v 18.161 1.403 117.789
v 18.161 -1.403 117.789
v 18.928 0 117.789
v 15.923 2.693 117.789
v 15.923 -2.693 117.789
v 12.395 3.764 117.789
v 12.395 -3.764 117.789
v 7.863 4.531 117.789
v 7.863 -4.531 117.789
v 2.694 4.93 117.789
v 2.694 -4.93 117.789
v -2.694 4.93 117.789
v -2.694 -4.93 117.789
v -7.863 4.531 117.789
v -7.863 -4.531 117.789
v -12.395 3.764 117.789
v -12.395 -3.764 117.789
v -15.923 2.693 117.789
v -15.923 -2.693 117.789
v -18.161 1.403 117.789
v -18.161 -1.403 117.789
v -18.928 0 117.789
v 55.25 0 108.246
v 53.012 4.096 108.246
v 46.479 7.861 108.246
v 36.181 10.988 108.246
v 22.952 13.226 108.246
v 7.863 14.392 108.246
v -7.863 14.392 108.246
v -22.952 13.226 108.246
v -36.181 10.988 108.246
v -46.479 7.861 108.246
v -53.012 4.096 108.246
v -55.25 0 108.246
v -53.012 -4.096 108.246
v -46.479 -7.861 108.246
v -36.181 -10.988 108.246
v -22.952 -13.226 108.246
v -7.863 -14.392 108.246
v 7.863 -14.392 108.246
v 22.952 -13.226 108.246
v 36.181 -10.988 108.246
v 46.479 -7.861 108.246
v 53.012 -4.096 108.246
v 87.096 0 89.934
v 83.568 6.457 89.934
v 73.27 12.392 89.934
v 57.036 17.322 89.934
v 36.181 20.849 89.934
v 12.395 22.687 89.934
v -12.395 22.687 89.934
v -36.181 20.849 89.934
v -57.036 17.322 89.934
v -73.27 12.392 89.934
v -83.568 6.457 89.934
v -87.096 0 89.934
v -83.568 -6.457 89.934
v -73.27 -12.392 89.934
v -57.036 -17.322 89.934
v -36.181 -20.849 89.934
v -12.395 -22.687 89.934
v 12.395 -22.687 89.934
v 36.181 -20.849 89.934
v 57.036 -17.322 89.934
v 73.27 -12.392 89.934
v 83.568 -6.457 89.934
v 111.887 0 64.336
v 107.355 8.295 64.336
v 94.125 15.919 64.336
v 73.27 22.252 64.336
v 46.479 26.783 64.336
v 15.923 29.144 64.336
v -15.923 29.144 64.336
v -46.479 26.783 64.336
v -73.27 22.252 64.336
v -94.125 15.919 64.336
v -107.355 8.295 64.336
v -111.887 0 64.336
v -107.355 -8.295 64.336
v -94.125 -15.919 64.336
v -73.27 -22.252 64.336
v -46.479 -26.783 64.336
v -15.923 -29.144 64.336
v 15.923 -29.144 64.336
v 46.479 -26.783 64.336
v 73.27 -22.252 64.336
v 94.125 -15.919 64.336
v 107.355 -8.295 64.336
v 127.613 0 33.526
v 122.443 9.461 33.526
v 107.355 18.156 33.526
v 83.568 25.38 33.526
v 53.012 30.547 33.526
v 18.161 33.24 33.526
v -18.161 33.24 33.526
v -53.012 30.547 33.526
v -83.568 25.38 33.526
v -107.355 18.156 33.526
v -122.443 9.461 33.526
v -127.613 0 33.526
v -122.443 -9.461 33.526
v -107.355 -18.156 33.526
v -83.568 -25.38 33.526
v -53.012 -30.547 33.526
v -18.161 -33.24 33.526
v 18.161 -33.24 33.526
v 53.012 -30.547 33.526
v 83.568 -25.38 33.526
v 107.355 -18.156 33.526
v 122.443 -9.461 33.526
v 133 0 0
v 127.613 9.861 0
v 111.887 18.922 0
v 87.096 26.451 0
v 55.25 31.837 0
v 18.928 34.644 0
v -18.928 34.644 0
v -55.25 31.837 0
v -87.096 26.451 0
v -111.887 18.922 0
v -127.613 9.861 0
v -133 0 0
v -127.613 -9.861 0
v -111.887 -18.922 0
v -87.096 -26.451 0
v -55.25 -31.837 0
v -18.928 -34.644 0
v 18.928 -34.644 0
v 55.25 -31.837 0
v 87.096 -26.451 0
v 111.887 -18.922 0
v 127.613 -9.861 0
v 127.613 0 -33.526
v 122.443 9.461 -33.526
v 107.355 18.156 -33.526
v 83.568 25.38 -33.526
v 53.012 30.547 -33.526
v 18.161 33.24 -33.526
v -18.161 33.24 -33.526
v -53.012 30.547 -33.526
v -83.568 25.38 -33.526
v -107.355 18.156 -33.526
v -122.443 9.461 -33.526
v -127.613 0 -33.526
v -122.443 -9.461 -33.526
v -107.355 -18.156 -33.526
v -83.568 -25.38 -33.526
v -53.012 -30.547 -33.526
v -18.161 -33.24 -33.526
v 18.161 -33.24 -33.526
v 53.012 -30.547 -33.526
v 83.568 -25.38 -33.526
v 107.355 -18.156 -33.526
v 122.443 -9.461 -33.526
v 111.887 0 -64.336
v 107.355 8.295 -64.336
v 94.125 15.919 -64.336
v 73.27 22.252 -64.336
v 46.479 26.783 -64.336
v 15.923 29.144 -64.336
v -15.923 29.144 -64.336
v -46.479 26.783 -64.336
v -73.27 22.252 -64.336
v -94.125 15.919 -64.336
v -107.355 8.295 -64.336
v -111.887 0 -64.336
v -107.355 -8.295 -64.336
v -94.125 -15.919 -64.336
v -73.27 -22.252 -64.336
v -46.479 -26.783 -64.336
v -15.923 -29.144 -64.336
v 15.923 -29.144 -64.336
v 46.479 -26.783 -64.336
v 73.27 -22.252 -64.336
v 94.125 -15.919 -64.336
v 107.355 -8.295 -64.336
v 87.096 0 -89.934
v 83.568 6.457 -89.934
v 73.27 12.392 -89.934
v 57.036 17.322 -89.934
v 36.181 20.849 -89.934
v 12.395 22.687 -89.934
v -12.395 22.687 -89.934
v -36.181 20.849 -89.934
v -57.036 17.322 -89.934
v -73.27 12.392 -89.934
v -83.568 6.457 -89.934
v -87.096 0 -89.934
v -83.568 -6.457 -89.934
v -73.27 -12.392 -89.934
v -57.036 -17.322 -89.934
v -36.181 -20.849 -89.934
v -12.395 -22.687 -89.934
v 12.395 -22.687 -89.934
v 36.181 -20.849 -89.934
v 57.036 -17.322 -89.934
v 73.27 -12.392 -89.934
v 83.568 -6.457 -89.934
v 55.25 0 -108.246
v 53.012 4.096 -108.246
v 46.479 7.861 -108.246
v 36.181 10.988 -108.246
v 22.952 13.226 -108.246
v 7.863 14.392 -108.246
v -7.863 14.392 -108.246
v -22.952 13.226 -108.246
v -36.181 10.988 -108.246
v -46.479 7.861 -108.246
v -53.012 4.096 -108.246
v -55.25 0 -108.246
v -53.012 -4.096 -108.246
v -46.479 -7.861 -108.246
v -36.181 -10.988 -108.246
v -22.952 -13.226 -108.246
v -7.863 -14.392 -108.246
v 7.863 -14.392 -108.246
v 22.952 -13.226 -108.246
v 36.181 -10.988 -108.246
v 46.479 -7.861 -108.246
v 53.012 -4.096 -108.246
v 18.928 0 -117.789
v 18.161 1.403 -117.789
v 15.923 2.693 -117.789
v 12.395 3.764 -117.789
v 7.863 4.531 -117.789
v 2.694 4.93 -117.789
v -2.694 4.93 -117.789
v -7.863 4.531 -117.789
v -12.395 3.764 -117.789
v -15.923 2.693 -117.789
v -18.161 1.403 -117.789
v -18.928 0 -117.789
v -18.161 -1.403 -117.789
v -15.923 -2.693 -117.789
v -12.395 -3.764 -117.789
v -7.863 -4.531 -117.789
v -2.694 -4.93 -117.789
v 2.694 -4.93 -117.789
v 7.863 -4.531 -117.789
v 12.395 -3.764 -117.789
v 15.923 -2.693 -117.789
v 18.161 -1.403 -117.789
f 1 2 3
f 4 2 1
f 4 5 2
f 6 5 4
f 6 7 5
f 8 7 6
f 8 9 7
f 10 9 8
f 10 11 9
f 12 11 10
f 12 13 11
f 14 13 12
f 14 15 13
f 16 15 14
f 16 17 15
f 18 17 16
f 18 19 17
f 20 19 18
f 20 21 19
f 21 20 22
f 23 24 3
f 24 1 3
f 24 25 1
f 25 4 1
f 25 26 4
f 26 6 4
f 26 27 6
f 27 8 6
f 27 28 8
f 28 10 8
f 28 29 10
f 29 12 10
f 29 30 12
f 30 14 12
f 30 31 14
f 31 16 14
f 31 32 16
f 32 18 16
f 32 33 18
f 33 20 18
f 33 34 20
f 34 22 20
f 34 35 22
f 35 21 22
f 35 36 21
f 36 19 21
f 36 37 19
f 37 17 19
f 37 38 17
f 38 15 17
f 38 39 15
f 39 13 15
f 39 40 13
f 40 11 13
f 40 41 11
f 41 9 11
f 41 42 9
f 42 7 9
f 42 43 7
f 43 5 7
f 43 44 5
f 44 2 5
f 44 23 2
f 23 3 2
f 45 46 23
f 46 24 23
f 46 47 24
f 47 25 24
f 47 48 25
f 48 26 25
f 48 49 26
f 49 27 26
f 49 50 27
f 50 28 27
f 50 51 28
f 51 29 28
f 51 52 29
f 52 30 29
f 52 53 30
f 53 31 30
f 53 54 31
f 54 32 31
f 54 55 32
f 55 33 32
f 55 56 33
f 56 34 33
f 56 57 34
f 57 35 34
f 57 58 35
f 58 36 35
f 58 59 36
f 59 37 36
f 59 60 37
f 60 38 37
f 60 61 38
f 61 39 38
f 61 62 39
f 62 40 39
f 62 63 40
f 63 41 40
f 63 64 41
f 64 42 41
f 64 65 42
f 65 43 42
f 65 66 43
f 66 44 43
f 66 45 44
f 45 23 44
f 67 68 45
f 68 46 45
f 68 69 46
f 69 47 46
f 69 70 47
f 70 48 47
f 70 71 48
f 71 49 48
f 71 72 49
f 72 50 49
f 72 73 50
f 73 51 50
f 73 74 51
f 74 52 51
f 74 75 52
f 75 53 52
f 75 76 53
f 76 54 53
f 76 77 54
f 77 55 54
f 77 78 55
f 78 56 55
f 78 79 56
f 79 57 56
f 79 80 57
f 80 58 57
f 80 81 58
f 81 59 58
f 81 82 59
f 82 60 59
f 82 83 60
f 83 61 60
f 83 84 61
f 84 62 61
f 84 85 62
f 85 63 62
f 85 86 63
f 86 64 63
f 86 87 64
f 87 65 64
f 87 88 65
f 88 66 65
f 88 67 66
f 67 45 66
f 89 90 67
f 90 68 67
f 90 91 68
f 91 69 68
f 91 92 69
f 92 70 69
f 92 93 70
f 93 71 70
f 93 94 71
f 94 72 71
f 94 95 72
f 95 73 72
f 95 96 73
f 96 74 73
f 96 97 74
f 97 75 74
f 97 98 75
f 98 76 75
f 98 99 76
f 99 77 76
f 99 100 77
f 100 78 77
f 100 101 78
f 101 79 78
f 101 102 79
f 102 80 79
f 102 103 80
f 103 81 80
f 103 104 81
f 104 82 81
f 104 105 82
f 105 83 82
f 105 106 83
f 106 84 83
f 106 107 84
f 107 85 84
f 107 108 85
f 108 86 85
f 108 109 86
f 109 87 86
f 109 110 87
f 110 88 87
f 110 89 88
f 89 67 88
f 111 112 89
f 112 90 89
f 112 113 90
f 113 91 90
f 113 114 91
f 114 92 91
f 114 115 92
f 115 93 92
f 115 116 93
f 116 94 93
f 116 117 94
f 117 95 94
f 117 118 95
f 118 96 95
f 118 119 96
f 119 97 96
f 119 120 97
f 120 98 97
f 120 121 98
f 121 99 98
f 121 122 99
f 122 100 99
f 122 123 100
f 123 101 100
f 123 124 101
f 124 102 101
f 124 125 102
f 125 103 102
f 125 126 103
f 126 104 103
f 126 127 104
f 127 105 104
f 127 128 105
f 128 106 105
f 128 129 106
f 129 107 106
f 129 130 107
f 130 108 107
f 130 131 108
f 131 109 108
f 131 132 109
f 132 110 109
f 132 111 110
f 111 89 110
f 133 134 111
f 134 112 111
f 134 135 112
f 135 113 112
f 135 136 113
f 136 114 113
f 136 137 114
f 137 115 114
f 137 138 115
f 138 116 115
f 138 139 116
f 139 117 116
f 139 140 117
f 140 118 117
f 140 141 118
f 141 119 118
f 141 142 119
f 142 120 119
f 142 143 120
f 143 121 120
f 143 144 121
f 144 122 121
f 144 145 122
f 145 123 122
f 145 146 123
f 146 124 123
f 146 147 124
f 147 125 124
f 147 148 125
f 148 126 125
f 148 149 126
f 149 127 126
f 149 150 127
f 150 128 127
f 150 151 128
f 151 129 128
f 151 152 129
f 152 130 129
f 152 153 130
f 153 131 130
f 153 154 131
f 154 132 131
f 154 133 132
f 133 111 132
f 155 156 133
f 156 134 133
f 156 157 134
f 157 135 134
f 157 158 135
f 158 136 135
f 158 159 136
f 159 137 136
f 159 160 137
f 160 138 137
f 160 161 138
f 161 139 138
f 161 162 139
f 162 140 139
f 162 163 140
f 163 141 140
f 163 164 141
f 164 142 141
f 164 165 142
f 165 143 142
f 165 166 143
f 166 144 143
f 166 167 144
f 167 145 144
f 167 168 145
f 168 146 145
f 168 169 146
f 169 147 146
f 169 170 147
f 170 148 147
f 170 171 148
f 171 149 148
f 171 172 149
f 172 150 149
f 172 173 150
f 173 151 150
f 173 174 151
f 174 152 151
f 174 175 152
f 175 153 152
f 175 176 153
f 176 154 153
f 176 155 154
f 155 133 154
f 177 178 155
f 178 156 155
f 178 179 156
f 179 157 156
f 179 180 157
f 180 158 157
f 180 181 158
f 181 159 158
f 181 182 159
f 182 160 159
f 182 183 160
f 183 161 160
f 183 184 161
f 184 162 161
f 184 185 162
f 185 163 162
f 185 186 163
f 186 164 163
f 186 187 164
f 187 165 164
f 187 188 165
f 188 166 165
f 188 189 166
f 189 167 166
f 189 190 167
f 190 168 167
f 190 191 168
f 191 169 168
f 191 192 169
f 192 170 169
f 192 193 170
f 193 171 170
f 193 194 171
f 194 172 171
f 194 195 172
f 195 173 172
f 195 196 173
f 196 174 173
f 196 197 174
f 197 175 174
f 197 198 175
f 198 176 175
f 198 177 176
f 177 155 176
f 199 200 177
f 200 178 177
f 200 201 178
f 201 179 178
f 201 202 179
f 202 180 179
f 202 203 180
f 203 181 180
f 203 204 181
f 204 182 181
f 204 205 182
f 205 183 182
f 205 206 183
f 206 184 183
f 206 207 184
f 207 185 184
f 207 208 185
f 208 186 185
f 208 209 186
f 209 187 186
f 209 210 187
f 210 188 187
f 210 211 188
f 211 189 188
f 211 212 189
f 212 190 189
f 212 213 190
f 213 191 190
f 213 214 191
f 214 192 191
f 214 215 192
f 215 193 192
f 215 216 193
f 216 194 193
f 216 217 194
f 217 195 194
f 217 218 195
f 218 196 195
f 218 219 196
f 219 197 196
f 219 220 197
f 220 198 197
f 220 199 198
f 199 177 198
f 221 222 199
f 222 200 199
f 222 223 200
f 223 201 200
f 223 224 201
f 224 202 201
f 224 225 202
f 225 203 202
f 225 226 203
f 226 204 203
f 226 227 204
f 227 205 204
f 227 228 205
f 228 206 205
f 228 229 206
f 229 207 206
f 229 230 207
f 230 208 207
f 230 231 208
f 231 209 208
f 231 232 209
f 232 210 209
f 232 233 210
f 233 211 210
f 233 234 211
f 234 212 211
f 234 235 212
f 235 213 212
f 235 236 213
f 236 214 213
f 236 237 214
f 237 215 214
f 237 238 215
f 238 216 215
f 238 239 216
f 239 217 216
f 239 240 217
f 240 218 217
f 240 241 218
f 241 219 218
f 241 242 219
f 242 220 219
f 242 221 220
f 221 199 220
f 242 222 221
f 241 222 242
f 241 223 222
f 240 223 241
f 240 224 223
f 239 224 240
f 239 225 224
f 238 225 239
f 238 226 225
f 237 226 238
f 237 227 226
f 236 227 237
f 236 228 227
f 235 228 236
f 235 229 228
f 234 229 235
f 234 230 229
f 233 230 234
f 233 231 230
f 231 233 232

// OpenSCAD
// Generated by SolidPython 1.0.1 on 2020-07-29 00:46:53


scale(v = [19, 5, 17]) {
	sphere(r = 7);
}
/***********************************************
*********      SolidPython code:      **********
************************************************
 
# import packages: SolidPython
from solid import *
from solid.utils import *
from itertools import chain, combinations, permutations


class Resize:

    def __init__(self, scad_file):
        self.scad_file = scad_file
        #self.scad_file = import_scad(scad_file)
        # cone/cylinder param:
        self.r1 = 0
        self.r2 = 0
        self.h = 0
        # rectangular prism param:
        self.w = 0
        self.l = 0
        # ellipse param:
        self.r = 0

    # import OpenScad code (file name corresponds to shape)


    # classify shape + parameters
    def assign(self, param1, param2, param3):
        if self.scad_file == 'cone.scad':
            self.r1 = param1
            self.r2 = param2
            self.h = param3
        elif self.scad_file == 'cylinder.scad':
            self.r1 = param1
            self.r2 = param2
            self.h = param3
        elif self.scad_file == 'rectangularPrism.scad':
            self.h = param1
            self.l = param2
            self.w = param3
        else:
            self.r = param1
            self.h = param2

    # resize parameters
    def iterate(self):
        x = range(3, 20, 2)
        i = 1
        if self.scad_file == 'cone.scad':
            tempList = list(permutations(x, 2))
            for temp in tempList:
                param1 = temp[0]
                param2 = temp[1]
                filepath = 'produced_scad_files/' + 'cone' + str(param1) + '_' + str(param2) + '_' + '.scad'
                scad_render_to_file(cylinder(h=param1, r1=param2, r2=0), filepath)

        elif self.scad_file == 'cylinder.scad':
            tempList = list(permutations(x, 3))
            for temp in tempList:
                param1 = temp[0]
                param2 = temp[1]
                filepath = 'produced_scad_files/' + 'cylinder' + str(param1) + '_' + str(param2) + '_' + '.scad'
                scad_render_to_file(cylinder(h=param1, r1=param2, r2=param2), filepath)

        elif self.scad_file == 'rectangularPrism.scad':
            tempList = list(permutations(x, 3))
            for temp in tempList:
                param1 = temp[0]
                param2 = temp[1]
                param3 = temp[2]
                filepath = 'produced_scad_files/' + 'rectangularPrism' + str(param1) + '_' + str(param2) + '_' + str(
                    param3) + '.scad'
                scad_render_to_file(cube(size=(param1, param2, param3)), filepath)

        elif self.scad_file == 'ellipse.scad':
            tempList = list(permutations(x, 4))
            for temp in tempList:
                param1 = temp[0]
                param2 = temp[1]
                param3 = temp[2]
                param4 = temp[3]
                filepath = 'produced_scad_files/' + 'ellipse' + str(param1) + '_' + str(param2) + '_' + str(param3) + '_' + str(param4) + '.scad'
                scad_render_to_file(scale([param1, param2, param3])(sphere(r=param4)), filepath)

    def render_to_scadfile(self):
        scad_render_to_file(scad, 'example.scad') 
 
************************************************/
